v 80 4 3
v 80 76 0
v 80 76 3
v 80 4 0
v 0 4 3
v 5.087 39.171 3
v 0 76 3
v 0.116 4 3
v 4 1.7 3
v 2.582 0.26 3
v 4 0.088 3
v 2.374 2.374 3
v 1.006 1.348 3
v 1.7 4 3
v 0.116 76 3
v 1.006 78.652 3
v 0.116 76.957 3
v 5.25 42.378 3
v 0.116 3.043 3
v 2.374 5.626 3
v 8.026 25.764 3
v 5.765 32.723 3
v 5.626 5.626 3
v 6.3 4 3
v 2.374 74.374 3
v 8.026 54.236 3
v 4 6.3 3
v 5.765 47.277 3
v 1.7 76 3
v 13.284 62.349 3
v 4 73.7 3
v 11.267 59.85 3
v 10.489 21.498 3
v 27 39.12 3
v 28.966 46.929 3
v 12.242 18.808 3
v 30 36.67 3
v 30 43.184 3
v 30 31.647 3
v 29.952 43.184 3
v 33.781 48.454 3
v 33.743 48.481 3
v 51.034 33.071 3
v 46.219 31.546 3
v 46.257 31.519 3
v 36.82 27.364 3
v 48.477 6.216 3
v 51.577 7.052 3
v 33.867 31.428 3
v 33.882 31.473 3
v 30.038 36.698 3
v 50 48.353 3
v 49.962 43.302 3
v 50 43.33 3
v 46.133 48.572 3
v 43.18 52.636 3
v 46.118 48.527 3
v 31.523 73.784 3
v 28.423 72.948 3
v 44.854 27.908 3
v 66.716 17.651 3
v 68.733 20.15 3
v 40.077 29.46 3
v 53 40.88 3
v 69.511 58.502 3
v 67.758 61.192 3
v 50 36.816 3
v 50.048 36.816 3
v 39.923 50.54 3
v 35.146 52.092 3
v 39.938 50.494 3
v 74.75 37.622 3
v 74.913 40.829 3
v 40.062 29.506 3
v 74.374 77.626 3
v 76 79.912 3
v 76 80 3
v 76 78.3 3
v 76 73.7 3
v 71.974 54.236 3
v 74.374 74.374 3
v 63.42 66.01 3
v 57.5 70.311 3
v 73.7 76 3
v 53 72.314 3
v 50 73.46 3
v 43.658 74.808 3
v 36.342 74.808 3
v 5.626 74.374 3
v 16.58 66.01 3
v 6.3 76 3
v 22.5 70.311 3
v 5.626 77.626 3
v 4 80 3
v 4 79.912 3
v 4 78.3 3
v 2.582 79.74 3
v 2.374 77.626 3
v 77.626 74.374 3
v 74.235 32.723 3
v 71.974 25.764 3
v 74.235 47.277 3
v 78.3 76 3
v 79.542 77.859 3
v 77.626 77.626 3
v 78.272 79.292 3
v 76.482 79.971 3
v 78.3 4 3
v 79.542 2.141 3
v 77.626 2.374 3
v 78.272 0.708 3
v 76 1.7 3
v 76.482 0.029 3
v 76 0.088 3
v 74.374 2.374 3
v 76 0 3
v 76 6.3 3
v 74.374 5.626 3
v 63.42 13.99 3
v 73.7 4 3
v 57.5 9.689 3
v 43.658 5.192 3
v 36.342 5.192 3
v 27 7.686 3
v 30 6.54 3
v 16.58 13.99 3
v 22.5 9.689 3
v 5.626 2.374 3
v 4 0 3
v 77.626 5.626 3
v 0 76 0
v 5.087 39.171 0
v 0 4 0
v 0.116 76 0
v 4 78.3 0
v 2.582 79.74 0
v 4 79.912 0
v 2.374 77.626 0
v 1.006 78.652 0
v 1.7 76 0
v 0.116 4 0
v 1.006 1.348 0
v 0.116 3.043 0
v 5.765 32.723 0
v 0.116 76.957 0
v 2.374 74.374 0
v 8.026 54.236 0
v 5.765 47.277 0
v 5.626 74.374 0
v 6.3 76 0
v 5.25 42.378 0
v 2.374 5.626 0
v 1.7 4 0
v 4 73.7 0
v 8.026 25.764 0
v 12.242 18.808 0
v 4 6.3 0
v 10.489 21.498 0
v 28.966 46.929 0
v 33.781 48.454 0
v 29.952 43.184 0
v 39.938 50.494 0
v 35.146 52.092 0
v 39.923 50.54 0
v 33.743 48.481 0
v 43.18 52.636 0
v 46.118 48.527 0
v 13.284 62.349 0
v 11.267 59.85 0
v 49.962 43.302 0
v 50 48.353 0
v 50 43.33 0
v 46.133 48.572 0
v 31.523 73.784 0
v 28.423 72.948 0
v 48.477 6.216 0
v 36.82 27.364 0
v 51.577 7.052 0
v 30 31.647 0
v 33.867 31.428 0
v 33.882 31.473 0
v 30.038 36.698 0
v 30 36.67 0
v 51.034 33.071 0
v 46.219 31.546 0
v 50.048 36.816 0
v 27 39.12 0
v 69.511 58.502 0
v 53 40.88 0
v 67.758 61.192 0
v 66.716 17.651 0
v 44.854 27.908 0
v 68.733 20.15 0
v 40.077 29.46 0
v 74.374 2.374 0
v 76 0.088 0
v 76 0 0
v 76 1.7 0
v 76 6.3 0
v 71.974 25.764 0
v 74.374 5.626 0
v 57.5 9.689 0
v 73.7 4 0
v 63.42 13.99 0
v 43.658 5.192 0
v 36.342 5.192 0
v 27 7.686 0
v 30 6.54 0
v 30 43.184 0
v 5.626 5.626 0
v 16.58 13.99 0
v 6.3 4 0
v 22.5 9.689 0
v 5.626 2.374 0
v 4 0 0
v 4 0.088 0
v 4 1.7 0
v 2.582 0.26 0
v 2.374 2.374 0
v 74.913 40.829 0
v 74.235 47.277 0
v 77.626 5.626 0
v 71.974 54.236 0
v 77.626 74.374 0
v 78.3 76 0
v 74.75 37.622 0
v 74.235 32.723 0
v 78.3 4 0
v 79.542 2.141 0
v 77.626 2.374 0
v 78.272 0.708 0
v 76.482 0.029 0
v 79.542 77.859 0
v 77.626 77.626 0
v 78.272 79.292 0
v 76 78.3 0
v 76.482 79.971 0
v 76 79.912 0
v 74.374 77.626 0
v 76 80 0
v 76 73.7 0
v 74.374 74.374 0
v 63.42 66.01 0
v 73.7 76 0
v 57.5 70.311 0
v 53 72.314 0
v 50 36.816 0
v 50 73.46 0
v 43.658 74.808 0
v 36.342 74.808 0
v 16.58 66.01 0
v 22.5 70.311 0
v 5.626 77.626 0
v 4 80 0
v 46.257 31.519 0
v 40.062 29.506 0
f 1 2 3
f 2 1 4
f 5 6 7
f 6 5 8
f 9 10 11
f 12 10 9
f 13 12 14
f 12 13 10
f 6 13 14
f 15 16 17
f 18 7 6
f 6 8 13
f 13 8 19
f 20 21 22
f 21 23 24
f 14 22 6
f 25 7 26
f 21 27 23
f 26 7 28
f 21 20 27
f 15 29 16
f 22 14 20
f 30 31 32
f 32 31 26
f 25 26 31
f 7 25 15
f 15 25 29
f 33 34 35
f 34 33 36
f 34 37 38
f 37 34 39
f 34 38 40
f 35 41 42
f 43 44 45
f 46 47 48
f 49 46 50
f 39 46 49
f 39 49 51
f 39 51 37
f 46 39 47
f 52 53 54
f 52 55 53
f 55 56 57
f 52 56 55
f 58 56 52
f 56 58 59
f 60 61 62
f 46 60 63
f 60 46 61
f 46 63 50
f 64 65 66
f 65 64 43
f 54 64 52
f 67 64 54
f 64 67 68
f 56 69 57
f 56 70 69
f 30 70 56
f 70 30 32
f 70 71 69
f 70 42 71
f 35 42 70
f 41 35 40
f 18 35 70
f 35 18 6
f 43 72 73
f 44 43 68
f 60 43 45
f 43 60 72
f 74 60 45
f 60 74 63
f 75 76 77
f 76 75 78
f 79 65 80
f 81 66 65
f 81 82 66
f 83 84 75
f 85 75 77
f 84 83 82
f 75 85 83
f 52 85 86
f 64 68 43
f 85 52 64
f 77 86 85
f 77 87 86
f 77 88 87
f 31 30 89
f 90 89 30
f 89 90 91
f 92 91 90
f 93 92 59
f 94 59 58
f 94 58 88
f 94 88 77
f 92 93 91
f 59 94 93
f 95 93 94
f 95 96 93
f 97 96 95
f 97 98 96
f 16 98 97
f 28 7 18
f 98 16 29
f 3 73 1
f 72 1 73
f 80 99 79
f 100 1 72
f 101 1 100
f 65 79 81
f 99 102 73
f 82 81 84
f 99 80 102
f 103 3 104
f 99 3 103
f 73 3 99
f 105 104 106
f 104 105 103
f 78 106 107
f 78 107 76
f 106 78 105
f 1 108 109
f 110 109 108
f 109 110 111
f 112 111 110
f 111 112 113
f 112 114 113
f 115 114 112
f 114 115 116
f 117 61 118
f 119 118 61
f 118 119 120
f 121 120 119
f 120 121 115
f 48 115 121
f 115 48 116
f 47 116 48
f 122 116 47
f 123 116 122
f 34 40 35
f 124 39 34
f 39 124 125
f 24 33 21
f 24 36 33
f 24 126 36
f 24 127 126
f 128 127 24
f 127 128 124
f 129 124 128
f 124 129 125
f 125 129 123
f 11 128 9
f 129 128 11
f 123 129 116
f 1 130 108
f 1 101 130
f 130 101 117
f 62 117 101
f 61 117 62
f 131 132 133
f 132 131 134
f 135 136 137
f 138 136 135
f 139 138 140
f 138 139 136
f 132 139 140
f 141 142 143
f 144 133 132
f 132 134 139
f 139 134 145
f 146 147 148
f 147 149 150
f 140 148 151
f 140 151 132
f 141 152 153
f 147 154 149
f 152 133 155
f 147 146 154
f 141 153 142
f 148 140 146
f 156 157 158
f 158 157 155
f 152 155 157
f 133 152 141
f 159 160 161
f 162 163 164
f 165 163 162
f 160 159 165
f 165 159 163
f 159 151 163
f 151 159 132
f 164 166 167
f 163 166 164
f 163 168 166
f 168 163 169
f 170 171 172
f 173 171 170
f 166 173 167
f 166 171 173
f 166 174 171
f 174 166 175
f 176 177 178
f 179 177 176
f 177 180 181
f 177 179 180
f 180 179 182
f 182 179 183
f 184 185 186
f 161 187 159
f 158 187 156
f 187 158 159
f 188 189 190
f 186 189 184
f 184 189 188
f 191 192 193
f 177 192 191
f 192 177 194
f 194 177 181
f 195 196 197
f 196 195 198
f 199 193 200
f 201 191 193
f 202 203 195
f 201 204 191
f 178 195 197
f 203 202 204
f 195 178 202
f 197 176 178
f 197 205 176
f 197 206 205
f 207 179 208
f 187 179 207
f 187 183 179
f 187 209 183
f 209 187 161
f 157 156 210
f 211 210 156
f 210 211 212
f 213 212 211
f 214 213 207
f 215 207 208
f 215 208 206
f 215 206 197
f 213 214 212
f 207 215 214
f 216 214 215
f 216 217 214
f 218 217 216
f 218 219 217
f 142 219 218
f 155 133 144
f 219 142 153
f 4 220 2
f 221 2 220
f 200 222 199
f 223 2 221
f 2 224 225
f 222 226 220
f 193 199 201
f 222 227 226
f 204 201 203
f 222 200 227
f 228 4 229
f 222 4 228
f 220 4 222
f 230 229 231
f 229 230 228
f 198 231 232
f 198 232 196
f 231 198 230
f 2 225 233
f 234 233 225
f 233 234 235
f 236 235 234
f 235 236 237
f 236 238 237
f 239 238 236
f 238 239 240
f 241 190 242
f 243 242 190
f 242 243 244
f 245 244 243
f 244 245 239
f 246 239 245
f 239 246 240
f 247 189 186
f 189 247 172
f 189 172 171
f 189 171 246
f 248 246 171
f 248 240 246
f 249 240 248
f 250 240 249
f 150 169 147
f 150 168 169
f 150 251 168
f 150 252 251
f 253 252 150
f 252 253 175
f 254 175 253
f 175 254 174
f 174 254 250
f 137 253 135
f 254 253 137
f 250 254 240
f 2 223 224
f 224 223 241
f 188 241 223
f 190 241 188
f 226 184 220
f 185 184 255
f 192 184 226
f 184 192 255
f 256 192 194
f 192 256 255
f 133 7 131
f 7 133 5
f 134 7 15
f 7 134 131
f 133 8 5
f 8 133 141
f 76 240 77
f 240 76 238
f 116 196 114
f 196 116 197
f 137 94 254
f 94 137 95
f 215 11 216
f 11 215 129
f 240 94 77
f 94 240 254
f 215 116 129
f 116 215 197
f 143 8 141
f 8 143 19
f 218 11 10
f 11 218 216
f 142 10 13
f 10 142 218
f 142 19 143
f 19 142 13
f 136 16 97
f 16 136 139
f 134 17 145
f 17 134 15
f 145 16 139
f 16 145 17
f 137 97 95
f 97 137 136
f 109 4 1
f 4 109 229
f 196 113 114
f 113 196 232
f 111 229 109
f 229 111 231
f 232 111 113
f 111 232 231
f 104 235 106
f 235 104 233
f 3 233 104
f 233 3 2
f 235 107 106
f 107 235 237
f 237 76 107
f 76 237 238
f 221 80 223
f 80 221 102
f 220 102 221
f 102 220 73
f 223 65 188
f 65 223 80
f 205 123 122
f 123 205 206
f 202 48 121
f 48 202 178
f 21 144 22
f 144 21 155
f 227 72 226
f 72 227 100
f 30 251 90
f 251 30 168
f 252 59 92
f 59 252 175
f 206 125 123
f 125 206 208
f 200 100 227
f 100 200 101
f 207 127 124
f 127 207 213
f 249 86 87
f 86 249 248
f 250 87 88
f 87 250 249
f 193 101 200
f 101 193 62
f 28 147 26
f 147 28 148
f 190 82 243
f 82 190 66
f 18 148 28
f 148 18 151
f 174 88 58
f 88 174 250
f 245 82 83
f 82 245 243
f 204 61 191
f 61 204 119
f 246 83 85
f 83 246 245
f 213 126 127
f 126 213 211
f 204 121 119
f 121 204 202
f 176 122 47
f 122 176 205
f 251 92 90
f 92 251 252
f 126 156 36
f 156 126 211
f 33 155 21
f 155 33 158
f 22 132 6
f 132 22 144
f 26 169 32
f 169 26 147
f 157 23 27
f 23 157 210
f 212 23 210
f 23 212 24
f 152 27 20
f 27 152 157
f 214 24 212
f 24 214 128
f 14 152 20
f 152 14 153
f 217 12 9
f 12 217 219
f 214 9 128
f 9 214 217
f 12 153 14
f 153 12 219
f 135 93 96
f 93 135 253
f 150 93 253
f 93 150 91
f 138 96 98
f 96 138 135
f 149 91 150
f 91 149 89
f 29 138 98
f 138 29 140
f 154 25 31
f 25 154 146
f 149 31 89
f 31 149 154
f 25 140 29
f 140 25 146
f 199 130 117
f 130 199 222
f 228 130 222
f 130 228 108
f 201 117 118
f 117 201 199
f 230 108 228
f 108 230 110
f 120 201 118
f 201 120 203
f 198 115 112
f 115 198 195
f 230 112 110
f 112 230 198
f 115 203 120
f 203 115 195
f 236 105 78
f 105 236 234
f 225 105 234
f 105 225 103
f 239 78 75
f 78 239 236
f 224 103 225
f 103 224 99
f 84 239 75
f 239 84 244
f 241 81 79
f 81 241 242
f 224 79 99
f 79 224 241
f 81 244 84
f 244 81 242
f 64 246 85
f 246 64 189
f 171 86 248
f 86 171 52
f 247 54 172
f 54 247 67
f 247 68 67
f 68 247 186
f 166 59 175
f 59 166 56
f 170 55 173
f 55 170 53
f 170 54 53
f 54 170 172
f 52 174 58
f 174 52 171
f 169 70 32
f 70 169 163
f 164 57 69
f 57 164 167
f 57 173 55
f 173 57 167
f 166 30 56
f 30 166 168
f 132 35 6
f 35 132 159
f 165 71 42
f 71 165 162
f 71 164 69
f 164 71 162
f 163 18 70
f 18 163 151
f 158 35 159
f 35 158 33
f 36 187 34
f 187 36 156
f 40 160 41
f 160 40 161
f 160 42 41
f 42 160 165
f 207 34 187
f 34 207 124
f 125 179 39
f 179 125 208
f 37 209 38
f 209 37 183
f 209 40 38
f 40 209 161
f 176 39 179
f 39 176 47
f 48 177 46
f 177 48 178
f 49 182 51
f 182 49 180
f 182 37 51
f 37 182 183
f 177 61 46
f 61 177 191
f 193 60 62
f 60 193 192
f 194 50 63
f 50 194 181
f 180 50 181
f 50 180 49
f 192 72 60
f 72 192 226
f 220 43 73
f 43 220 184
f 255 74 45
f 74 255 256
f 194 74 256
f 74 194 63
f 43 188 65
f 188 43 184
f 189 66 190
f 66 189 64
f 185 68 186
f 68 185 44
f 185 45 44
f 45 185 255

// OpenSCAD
// Body Parameters
size=80;
borderthickness=5;
cornerradius=4;
thickness=3;

dxf=false;

// Screw Hole Parameters
screwradius=2.3;
screwinset=4;

// Spine Parameters
spines=10;
spinesize=3;
spineoffset=10;
spinerotation=0;


// Below are not parameters //

// Calculate helper variables
holeradius=size/2-borderthickness;

// Create the grill
if (dxf)
	projection(cut=false) fan_grill();
else
	fan_grill();

module fan_grill()
{
	union()
	{
		difference()
		{
			body();

			// hole
			translate([size/2,size/2,0]) cylinder(r=holeradius,h=thickness);

			// screws
			translate([screwinset,screwinset,0]) cylinder(r=screwradius,h=thickness);
			translate([screwinset,size-screwinset,0]) cylinder(r=screwradius,h=thickness);
			translate([size-screwinset,screwinset,0]) cylinder(r=screwradius,h=thickness);
			translate([size-screwinset,size-screwinset,0]) cylinder(r=screwradius,h=thickness);
		}
		translate([size/2,size/2,0])
		interrior();
	}
}

module body()
{
	union()
	{
		translate([0,cornerradius,0]) cube(size=[size,size-(cornerradius*2),thickness]);
		translate([cornerradius,0,0]) cube(size=[size-(cornerradius*2),size,thickness]);
		translate([cornerradius,cornerradius,0]) cylinder(r=cornerradius,h=thickness);
		translate([cornerradius,size-cornerradius,0]) cylinder(r=cornerradius,h=thickness);
		translate([size-cornerradius,cornerradius,0]) cylinder(r=cornerradius,h=thickness);
		translate([size-cornerradius,size-cornerradius,0]) cylinder(r=cornerradius,h=thickness);
	}
}

module interrior()
{
	for(i=[0:spines-1])
	{
		  rotate(a=[0,0,i*(360.0/spines)+spinerotation]) 
		  translate([spineoffset,-spineoffset/3.141,0])
		  cube([spinesize,holeradius+(spineoffset/3.141),spinesize]);
	}
}
